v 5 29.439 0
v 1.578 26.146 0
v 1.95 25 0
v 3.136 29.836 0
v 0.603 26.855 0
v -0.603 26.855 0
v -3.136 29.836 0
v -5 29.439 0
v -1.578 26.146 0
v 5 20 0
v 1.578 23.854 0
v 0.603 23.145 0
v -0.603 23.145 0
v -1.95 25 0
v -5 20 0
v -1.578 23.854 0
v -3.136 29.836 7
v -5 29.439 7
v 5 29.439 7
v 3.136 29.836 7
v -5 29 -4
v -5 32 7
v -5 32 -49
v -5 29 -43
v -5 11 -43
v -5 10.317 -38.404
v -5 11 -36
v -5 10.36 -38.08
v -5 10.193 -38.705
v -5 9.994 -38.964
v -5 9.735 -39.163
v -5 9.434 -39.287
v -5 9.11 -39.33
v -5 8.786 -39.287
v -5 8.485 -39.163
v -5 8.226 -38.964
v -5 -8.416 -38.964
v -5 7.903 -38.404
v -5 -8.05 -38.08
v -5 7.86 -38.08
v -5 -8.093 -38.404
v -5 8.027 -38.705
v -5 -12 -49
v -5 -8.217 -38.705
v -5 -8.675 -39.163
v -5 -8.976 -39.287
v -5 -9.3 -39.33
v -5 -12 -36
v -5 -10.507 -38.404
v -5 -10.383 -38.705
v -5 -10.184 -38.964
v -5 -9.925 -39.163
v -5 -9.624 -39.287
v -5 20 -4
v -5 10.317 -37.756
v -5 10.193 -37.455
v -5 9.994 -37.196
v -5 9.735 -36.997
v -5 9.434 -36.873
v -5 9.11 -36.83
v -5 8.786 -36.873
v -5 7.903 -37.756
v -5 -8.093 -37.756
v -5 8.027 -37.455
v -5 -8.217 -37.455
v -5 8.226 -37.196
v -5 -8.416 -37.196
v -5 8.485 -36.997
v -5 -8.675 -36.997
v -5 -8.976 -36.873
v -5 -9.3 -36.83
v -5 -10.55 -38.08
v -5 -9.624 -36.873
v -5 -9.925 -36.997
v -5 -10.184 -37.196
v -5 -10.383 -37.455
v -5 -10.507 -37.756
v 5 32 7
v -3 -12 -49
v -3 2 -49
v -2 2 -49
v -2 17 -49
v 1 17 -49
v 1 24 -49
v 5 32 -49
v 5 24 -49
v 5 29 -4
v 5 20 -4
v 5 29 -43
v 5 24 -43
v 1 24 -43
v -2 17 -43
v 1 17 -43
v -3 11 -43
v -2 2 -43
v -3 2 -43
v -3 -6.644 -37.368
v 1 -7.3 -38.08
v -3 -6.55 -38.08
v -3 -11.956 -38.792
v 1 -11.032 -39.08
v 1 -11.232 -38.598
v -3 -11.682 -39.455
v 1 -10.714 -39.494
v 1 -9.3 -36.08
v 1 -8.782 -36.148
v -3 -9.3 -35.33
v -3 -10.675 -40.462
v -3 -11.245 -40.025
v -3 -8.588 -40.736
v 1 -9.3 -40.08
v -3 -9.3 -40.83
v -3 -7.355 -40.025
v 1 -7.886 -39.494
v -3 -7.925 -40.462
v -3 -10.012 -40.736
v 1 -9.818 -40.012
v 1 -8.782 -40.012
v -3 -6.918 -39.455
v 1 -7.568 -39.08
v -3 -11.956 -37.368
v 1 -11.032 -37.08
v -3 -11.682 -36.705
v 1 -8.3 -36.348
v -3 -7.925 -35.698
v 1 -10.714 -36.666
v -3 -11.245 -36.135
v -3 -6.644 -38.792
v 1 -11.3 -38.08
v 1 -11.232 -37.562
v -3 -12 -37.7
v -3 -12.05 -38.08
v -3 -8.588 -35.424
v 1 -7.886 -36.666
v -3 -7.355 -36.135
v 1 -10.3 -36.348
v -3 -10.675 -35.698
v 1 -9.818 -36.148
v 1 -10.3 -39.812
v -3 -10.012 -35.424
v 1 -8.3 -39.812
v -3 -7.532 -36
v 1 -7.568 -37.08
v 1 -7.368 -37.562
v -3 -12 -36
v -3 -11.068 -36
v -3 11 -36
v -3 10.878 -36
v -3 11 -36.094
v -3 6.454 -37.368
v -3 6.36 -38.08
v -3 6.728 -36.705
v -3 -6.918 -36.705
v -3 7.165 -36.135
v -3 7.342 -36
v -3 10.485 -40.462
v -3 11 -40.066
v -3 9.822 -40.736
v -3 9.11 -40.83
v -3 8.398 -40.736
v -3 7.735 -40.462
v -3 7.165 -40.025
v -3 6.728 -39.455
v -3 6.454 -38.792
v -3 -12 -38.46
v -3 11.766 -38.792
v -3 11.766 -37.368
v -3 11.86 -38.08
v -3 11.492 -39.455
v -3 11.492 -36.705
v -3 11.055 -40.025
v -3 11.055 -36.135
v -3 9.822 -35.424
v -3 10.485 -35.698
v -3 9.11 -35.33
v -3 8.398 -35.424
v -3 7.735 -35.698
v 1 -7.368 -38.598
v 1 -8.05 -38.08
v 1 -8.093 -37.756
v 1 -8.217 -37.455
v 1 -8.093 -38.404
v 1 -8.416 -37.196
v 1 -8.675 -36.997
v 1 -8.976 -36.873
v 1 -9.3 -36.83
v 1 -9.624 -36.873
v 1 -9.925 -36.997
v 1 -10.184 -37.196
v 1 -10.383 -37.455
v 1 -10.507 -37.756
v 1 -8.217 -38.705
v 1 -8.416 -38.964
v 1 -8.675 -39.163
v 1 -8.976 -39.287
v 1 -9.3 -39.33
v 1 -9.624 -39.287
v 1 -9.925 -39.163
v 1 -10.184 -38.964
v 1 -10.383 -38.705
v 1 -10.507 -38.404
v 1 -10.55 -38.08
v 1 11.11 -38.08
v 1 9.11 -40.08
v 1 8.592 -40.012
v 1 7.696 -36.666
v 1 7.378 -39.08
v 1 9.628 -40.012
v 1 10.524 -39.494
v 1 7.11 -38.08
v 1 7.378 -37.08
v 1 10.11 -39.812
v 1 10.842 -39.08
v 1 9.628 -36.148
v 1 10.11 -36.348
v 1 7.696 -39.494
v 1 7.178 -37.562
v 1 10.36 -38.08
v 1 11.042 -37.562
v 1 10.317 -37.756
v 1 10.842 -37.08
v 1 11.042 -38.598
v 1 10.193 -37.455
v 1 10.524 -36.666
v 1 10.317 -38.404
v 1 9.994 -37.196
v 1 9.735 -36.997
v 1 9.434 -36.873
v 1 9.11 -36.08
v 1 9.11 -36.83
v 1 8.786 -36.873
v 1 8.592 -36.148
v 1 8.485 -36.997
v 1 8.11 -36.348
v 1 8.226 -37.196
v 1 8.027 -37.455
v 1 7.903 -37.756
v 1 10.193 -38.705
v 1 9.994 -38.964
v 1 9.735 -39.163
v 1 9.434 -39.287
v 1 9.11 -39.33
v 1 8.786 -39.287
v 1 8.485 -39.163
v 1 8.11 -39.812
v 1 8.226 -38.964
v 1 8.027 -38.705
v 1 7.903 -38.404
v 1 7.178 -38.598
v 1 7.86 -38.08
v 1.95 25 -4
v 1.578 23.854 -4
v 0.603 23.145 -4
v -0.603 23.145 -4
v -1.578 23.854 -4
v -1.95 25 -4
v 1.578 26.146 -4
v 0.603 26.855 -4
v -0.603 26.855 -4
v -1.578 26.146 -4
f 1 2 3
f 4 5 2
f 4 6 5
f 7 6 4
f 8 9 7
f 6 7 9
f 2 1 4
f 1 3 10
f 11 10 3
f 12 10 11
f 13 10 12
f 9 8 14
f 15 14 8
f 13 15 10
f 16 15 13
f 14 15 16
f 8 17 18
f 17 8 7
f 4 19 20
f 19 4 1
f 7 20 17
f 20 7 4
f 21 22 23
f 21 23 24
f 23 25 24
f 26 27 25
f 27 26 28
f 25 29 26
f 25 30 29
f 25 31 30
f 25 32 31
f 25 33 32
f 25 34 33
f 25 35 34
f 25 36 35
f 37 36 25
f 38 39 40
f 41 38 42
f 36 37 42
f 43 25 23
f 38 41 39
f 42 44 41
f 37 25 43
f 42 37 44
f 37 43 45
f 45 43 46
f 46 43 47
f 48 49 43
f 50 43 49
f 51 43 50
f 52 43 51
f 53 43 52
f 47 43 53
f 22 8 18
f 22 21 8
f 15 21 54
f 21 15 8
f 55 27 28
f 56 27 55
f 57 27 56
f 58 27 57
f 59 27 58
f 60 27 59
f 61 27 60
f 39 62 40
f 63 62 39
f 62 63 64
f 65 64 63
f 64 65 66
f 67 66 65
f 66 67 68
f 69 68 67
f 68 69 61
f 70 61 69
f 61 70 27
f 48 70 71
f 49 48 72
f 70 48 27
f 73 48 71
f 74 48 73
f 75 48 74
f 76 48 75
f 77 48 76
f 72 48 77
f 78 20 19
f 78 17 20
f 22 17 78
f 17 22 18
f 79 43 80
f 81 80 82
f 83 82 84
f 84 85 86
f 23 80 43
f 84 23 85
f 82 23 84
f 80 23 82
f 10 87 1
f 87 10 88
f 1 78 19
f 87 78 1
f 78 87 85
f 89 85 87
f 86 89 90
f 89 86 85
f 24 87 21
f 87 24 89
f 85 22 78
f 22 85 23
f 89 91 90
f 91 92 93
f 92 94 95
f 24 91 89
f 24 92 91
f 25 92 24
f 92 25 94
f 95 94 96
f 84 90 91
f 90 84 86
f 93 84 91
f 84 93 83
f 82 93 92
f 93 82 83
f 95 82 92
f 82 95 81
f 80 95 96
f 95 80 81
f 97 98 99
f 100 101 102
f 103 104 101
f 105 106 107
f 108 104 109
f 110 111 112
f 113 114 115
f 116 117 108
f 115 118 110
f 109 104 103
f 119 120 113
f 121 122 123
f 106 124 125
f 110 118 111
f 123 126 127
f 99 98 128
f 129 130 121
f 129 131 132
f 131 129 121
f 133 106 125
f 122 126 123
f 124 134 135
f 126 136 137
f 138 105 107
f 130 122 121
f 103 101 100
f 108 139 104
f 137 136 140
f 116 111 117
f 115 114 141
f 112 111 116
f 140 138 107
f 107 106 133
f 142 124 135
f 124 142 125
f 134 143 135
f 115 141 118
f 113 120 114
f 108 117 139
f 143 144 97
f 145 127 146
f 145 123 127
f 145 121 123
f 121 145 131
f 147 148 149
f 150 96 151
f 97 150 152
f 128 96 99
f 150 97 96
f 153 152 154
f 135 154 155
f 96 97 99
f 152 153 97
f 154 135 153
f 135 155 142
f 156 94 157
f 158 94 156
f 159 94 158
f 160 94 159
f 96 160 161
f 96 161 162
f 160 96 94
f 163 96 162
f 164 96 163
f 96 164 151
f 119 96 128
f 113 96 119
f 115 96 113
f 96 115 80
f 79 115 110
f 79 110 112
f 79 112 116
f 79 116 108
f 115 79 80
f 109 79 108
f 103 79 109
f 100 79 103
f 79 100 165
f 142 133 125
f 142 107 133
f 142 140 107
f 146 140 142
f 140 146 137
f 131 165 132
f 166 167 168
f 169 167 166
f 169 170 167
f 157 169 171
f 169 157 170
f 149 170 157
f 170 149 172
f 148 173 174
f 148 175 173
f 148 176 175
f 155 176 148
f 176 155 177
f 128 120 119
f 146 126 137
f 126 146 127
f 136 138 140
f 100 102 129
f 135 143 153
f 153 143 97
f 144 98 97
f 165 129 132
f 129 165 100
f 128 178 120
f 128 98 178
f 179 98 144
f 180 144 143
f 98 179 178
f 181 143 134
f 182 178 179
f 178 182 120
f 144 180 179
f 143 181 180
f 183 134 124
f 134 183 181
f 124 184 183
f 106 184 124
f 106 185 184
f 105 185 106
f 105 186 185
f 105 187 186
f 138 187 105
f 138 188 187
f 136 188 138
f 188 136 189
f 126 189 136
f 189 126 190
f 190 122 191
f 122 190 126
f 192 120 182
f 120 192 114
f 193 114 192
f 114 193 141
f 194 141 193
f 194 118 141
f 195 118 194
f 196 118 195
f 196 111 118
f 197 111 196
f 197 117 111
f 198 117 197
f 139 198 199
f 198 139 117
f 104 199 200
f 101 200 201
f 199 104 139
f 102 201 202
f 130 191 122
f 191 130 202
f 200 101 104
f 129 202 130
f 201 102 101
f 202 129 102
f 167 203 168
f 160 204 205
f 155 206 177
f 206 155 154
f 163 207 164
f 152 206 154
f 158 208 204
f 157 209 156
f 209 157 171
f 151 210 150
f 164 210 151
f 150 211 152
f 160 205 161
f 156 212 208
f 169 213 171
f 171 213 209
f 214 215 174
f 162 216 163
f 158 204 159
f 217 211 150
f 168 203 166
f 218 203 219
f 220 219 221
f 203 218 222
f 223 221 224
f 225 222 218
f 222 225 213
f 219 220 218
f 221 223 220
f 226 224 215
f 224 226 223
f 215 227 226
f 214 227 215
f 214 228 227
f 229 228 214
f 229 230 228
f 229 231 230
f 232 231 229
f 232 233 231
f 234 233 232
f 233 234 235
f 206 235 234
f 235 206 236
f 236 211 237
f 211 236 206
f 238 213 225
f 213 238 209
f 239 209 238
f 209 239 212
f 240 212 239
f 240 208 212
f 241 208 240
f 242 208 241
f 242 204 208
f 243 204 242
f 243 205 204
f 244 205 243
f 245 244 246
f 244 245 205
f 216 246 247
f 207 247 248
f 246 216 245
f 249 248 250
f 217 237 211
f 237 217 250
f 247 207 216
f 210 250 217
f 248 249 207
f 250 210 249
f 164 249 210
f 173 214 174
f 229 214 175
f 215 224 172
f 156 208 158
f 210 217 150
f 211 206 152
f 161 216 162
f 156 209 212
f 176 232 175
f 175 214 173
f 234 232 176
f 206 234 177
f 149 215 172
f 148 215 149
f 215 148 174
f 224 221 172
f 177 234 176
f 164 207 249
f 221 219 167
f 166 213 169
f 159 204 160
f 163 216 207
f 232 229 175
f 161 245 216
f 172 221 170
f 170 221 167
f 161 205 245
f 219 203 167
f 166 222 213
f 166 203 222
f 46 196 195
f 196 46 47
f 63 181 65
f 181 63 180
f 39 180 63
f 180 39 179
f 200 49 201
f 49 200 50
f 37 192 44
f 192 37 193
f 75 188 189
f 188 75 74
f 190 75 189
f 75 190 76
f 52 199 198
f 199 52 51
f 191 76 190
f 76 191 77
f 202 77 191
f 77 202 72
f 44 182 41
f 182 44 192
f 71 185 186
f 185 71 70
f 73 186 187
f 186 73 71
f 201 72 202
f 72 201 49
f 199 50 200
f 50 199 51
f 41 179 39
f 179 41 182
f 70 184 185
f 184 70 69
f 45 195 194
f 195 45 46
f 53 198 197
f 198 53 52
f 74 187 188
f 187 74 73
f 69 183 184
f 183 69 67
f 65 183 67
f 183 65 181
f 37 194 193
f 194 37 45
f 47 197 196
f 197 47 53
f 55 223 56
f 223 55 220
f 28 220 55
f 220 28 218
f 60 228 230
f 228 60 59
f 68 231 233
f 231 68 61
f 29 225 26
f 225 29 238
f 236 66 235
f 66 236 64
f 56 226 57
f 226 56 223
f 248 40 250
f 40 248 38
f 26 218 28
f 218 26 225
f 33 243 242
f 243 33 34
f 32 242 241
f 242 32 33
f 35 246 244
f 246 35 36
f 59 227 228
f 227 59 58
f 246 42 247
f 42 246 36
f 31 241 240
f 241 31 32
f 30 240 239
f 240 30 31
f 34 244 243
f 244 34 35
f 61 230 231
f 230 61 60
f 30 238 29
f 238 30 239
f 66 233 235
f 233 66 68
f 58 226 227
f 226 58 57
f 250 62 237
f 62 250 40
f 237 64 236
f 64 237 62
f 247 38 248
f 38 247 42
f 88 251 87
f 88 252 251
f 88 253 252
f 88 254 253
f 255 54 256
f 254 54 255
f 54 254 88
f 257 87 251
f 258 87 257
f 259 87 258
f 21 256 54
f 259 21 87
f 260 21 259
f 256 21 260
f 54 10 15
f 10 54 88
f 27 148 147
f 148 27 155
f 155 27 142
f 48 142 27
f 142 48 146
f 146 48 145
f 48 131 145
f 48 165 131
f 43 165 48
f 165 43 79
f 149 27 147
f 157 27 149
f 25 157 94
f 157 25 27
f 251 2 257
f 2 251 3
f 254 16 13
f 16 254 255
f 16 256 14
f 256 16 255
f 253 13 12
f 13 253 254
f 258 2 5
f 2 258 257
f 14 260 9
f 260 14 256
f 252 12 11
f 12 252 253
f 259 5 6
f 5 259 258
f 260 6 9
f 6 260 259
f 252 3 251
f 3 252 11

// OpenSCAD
// file: Geeetech/utility.scad
//
// Copyright (C) 2015, Jason S. McMullan <jason.mcmullan@gmail.com>
// All right reserved.
//
// Licensed under the MIT License:
//
// Permission is hereby granted, free of charge, to any person obtaining
// a copy of this software and associated documentation files (the "Software"),
// to deal in the Software without restriction, including without limitation
// the rights to use, copy, modify, merge, publish, distribute, sublicense,
// and/or sell copies of the Software, and to permit persons to whom the
// Software is furnished to do so, subject to the following conditions:
//
// The above copyright notice and this permission notice shall be included
// in all copies or substantial portions of the Software.
//
// THE SOFTWARE IS PROVIDED "AS IS", WITHOUT WARRANTY OF ANY KIND, EXPRESS OR
// IMPLIED, INCLUDING BUT NOT LIMITED TO THE WARRANTIES OF MERCHANTABILITY,
// FITNESS FOR A PARTICULAR PURPOSE AND NONINFRINGEMENT. IN NO EVENT SHALL THE
// AUTHORS OR COPYRIGHT HOLDERS BE LIABLE FOR ANY CLAIM, DAMAGES OR OTHER
// LIABILITY, WHETHER IN AN ACTION OF CONTRACT, TORT OR OTHERWISE, ARISING
// FROM, OUT OF OR IN CONNECTION WITH THE SOFTWARE OR THE USE OR OTHER
// DEALINGS IN THE SOFTWARE.
//

// Like the towers of hanoi, this adds a cylinder, then calls
// children() to stack another on top. Useful for modelling J-Heads
module utility_hanoi(d=1, h=1, fn=24)
{
    cylinder(d=d, h=h, $fn=fn);
    translate([0, 0, h])
        children();
}


// make a plate with mitred edges
module utility_plate_mitred_edge(size=[20, 30, 4], radius=4)
{
    hull() {
        translate([-(size[0]/2-radius), (size[1]/2-radius)])
            cylinder(r=radius, h=size[2], $fn=24);
        translate([-(size[0]/2-radius), -(size[1]/2-radius)])
            cylinder(r=radius, h=size[2], $fn=24);
        translate([(size[0]/2-radius), (size[1]/2-radius)])
            cylinder(r=radius, h=size[2], $fn=24);
        translate([(size[0]/2-radius), -(size[1]/2-radius)])
            cylinder(r=radius, h=size[2], $fn=24);
    }
}

module utility_plate_mitred_top(size=[20, 30, 20], radius=4)
{
    translate([-size[0]/2, -size[1]/2, 0])
    hull() {
        cube([size[0], size[1], size[2] - radius]);
        translate([radius, 0, size[2] - radius])
            rotate([-90, 0, 0]) {
                cylinder(r=radius, h=size[1]);
                translate([size[0]-radius*2, 0, 0])
                    cylinder(r=radius, h=size[1]);
        }
    }
}

// make a cylinder or torus a mitred top
module utility_torus_mitred_top(id=10, od=40, height=8, radius=2, hole = true)
{
    rotate_extrude() {
        hull()
        {
            translate([id/2+radius, height-radius]) circle(r=radius,$fn=24);
            translate([od/2-radius, height-radius]) circle(r=radius,$fn=24);
            if (hole)
                translate([id/2,0]) square([(od-id)/2, height-radius]);
            else
                square([od/2, height]);
        }
    }
}

// vim: set shiftwidth=4 expandtab: //
// file: E3D/v6_nozzle.scad
//
// Copyright (C) 2015, Jason S. McMullan <jason.mcmullan@gmail.com>
// All right reserved.
//
// Redistribution and use in source and binary forms, with or without
// modification, are permitted provided that the following conditions
// are met:
// 1. Redistributions of source code must retain the above copyright
//    notice, this list of conditions and the following disclaimer,
//    without modification, immediately at the beginning of the file.
// 2. Redistributions in binary form must reproduce the above copyright
//    notice, this list of conditions and the following disclaimer in the
//    documentation and/or other materials provided with the distribution.
//
// THIS SOFTWARE IS PROVIDED BY THE AUTHOR ``AS IS\'\' AND ANY EXPRESS OR
// IMPLIED WARRANTIES, INCLUDING, BUT NOT LIMITED TO, THE IMPLIED WARRANTIES
// OF MERCHANTABILITY AND FITNESS FOR A PARTICULAR PURPOSE ARE DISCLAIMED.
// IN NO EVENT SHALL THE AUTHOR BE LIABLE FOR ANY DIRECT, INDIRECT,
// INCIDENTAL, SPECIAL, EXEMPLARY, OR CONSEQUENTIAL DAMAGES (INCLUDING, BUT
// NOT LIMITED TO, PROCUREMENT OF SUBSTITUTE GOODS OR SERVICES; LOSS OF USE,
// DATA, OR PROFITS; OR BUSINESS INTERRUPTION) HOWEVER CAUSED AND ON ANY
// THEORY OF LIABILITY, WHETHER IN CONTRACT, STRICT LIABILITY, OR TORT
// (INCLUDING NEGLIGENCE OR OTHERWISE) ARISING IN ANY WAY OUT OF THE USE OF
// THIS SOFTWARE, EVEN IF ADVISED OF THE POSSIBILITY OF SUCH DAMAGE.
//
// All units are in mm

// The nozzle tip is located at (0,0,0)
// The nozzle is 12.5mm high
// The nozzle defaults to the 0.3mm geometry
// Children attached at the bottom center of the screw threads
module e3d_v6_nozzle() {
    difference() {
        union() {
            cylinder(d1=0.75, d2=(0.75+2*cos(125-90)*(12.5-10.7)), h=(12.5-10.7), $fn=10);
            translate([0, 0, (12.5-10.7)]) {
                cylinder(r=7/sqrt(3), h=3, $fn=6);
                translate([0, 0, 3]) {
                    cylinder(d=5, h=1.5);
                    translate([0,0, 1.5]) {
                        cylinder(d=6, h=6, $fn=15);
                    }
                }
            }
        }
        translate([0, 0, -0.1])
            cylinder(r=0.3, h=(12.5-10.7)+0.1);
        translate([0, 0, 12.5-10.7])
            cylinder(d=2, h=10.7+0.1, $fn=10);
    }

    translate([0, 0, (12.5-10.7+3+1.5)])
    children();
}

// vim: set shiftwidth=4 expandtab: //
// file: E3D/v6_block.scad
//
// Copyright (C) 2015, Jason S. McMullan <jason.mcmullan@gmail.com>
// All right reserved.
//
// Redistribution and use in source and binary forms, with or without
// modification, are permitted provided that the following conditions
// are met:
// 1. Redistributions of source code must retain the above copyright
//    notice, this list of conditions and the following disclaimer,
//    without modification, immediately at the beginning of the file.
// 2. Redistributions in binary form must reproduce the above copyright
//    notice, this list of conditions and the following disclaimer in the
//    documentation and/or other materials provided with the distribution.
//
// THIS SOFTWARE IS PROVIDED BY THE AUTHOR ``AS IS\'\' AND ANY EXPRESS OR
// IMPLIED WARRANTIES, INCLUDING, BUT NOT LIMITED TO, THE IMPLIED WARRANTIES
// OF MERCHANTABILITY AND FITNESS FOR A PARTICULAR PURPOSE ARE DISCLAIMED.
// IN NO EVENT SHALL THE AUTHOR BE LIABLE FOR ANY DIRECT, INDIRECT,
// INCIDENTAL, SPECIAL, EXEMPLARY, OR CONSEQUENTIAL DAMAGES (INCLUDING, BUT
// NOT LIMITED TO, PROCUREMENT OF SUBSTITUTE GOODS OR SERVICES; LOSS OF USE,
// DATA, OR PROFITS; OR BUSINESS INTERRUPTION) HOWEVER CAUSED AND ON ANY
// THEORY OF LIABILITY, WHETHER IN CONTRACT, STRICT LIABILITY, OR TORT
// (INCLUDING NEGLIGENCE OR OTHERWISE) ARISING IN ANY WAY OUT OF THE USE OF
// THIS SOFTWARE, EVEN IF ADVISED OF THE POSSIBILITY OF SUCH DAMAGE.
//
// All units are in mm

include <utility.scad>

// Origin (0,0,0) is bottom center of transition zone thread
// Children attached at top center of transition zone thread
module e3d_v6_block()
{
        translate([-15.5, -8, 0])
        difference() {
            cube([20, 16, 11.5]);
            translate([2.5, 8, 11.5])
                drill_down(diameter=3, depth=12);
            translate([15.5, 8, 11.5])
                drill_down(diameter=6, depth=12);
            translate([-0.1, -0.1, 3])
                cube([6, 16.2, 2]);
            translate([8.5, 0, 4])
                rotate([90, 0, 0])
                drill_down(diameter=6, depth=16.1);
            translate([16.5, 0, 4.8])
                rotate([90, 0, 0])
                drill_down(diameter=3, depth=3.5);
            translate([18, 0, 2])
                rotate([90, 0, 0]) {
                    drill_down(diameter=2, depth=2);
                    drill_down(diameter=1.5, depth=4.5);
                }
        }

        translate([0, 0, 11.5])
            children();
}

// vim: set shiftwidth=4 expandtab: //
// file: E3D/utility.scad
//
// Copyright (C) 2015, Jason S. McMullan <jason.mcmullan@gmail.com>
// All right reserved.
//
// Redistribution and use in source and binary forms, with or without
// modification, are permitted provided that the following conditions
// are met:
// 1. Redistributions of source code must retain the above copyright
//    notice, this list of conditions and the following disclaimer,
//    without modification, immediately at the beginning of the file.
// 2. Redistributions in binary form must reproduce the above copyright
//    notice, this list of conditions and the following disclaimer in the
//    documentation and/or other materials provided with the distribution.
//
// THIS SOFTWARE IS PROVIDED BY THE AUTHOR ``AS IS\'\' AND ANY EXPRESS OR
// IMPLIED WARRANTIES, INCLUDING, BUT NOT LIMITED TO, THE IMPLIED WARRANTIES
// OF MERCHANTABILITY AND FITNESS FOR A PARTICULAR PURPOSE ARE DISCLAIMED.
// IN NO EVENT SHALL THE AUTHOR BE LIABLE FOR ANY DIRECT, INDIRECT,
// INCIDENTAL, SPECIAL, EXEMPLARY, OR CONSEQUENTIAL DAMAGES (INCLUDING, BUT
// NOT LIMITED TO, PROCUREMENT OF SUBSTITUTE GOODS OR SERVICES; LOSS OF USE,
// DATA, OR PROFITS; OR BUSINESS INTERRUPTION) HOWEVER CAUSED AND ON ANY
// THEORY OF LIABILITY, WHETHER IN CONTRACT, STRICT LIABILITY, OR TORT
// (INCLUDING NEGLIGENCE OR OTHERWISE) ARISING IN ANY WAY OUT OF THE USE OF
// THIS SOFTWARE, EVEN IF ADVISED OF THE POSSIBILITY OF SUCH DAMAGE.
//
// All units are in mm

// Origin is top, left, front
module fan(size=20, height=5)
{
    translate([0, 0, -height]) {
        difference() {
                cube([size, size, height]);
                translate([size/2, size/2, -0.1])
                    cylinder(d=size*0.8, h=height+0.2, $fn=24);
        }
        translate([size/2, size/2, -0.1])
            cylinder(d=size*0.5, h=height+0.2, $fn=24);
    }
}

module drill_down(diameter=3, depth=5)
{
    translate([0, 0, -depth])
        cylinder(r=diameter/2, h=depth+0.01, $fn=10);
}

// Like the towers of hanoi, this adds a cylinder, then calls
// children() to stack another on top. Useful for the E3D heat sinks.
module hanoi(d=1, h=1, fn=24)
{
    cylinder(d=d, h=h, $fn=fn);
    translate([0, 0, h])
        children();
}

// vim: set shiftwidth=4 expandtab: //
// file: Geeetech/rostock_g2_spider.scad
//
// Copyright (C) 2015, Jason S. McMullan <jason.mcmullan@gmail.com>
// All right reserved.
//
// Licensed under the MIT License:
//
// Permission is hereby granted, free of charge, to any person obtaining
// a copy of this software and associated documentation files (the "Software"),
// to deal in the Software without restriction, including without limitation
// the rights to use, copy, modify, merge, publish, distribute, sublicense,
// and/or sell copies of the Software, and to permit persons to whom the
// Software is furnished to do so, subject to the following conditions:
//
// The above copyright notice and this permission notice shall be included
// in all copies or substantial portions of the Software.
//
// THE SOFTWARE IS PROVIDED "AS IS", WITHOUT WARRANTY OF ANY KIND, EXPRESS OR
// IMPLIED, INCLUDING BUT NOT LIMITED TO THE WARRANTIES OF MERCHANTABILITY,
// FITNESS FOR A PARTICULAR PURPOSE AND NONINFRINGEMENT. IN NO EVENT SHALL THE
// AUTHORS OR COPYRIGHT HOLDERS BE LIABLE FOR ANY CLAIM, DAMAGES OR OTHER
// LIABILITY, WHETHER IN AN ACTION OF CONTRACT, TORT OR OTHERWISE, ARISING
// FROM, OUT OF OR IN CONNECTION WITH THE SOFTWARE OR THE USE OR OTHER
// DEALINGS IN THE SOFTWARE.
//

use <utility.scad>

module geeetech_rostock_g2_spider_leg()
{
  translate([14, 17, 0]) {
    cube([9, 13, 8]);
    cube([9, 17, 3]);
  }
  translate([14, 34, 6])
    rotate([0, 90, 0]) {
        difference() {
            cylinder(d=12, h=9, $fn=24);
            translate([0, 0, -0.1])
            cylinder(d=6.25, h=9.2, $fn=24);
        }
    }
}

module geeetech_rostock_g2_spider_bracket()
{
    geeetech_rostock_g2_spider_leg();
    mirror([1, 0, 0]) geeetech_rostock_g2_spider_leg();
}


module geeetech_rostock_g2_spider_zprobe()
{
    translate([-10, 26, 0])
        cube([20, 4, 8]);
    translate([-6, 20, 0])
        cube([12, 10, 19.2]);
}

module geeetech_rostock_g2_spider_blank(zprobe = true, hole = false)
{
    difference() {
        union() {
            utility_torus_mitred_top(id=40.125, od=60, height=8, radius=1.5, hole=hole);

            for (i = [0:2]) {
                rotate([0, 0, i*120]) geeetech_rostock_g2_spider_bracket();
            }

            if (zprobe)
                geeetech_rostock_g2_spider_zprobe();
        }
                // Z-probe drills
        if (zprobe) {
           translate([-4.7, 30.1, 5.5])
                rotate([90, 0, 0])
                    cylinder(d=3-0.2, h=8.2, $fn=12);
           translate([4.7, 30.1, 5.5])
                rotate([90, 0, 0])
                    cylinder(d=3-0.2, h=8.2, $fn=12);
            translate([0, 23.5, -0.1])
                cylinder(d=3+0.5, h=20, $fn=12);
            translate([-1.5, 24, 8])
                cube([3, 8, 18]);
            translate([0, 22-0.5, 17])
                rotate([0, 0, 15]) cube([8, 3, 3]);
        }
    }
}

module geeetech_rostock_g2_spider(zprobe = true, hole = true)
{
    difference() {
        geeetech_rostock_g2_spider_blank(zprobe=zprobe, hole=hole);

        // Drills for Geetech J-Head and fan mounts
        for (i = [(zprobe ? 1 : 0):5]) {
            rotate([0, 0, i*60]) translate([0, 25, -0.1])
                cylinder(d=4.25, h=10, $fn=24);
        }
    }
}

// Debug interference model:
if (false) {
    # translate([-46.125, -40+0.125, 0])
            import("RKMA-B02-platform.STL", convexity=5);
    geeetech_rostock_g2_spider(zprobe=true);
}

module geeetech_rostock_g2_spider_no_probe()
{
    geeetech_rostock_g2_spider(zprobe=false);
}

module geeetech_rostock_g2_spider_z_probe()
{
    geeetech_rostock_g2_spider(zprobe=true);
}

// vim: set shiftwidth=4 expandtab: //
// file: Geeetech/rostock_g2_jhead_x2.scad
//
// Copyright (C) 2015, Jason S. McMullan <jason.mcmullan@gmail.com>
// All right reserved.
//
// Licensed under the MIT License:
//
// Permission is hereby granted, free of charge, to any person obtaining
// a copy of this software and associated documentation files (the "Software"),
// to deal in the Software without restriction, including without limitation
// the rights to use, copy, modify, merge, publish, distribute, sublicense,
// and/or sell copies of the Software, and to permit persons to whom the
// Software is furnished to do so, subject to the following conditions:
//
// The above copyright notice and this permission notice shall be included
// in all copies or substantial portions of the Software.
//
// THE SOFTWARE IS PROVIDED "AS IS", WITHOUT WARRANTY OF ANY KIND, EXPRESS OR
// IMPLIED, INCLUDING BUT NOT LIMITED TO THE WARRANTIES OF MERCHANTABILITY,
// FITNESS FOR A PARTICULAR PURPOSE AND NONINFRINGEMENT. IN NO EVENT SHALL THE
// AUTHORS OR COPYRIGHT HOLDERS BE LIABLE FOR ANY CLAIM, DAMAGES OR OTHER
// LIABILITY, WHETHER IN AN ACTION OF CONTRACT, TORT OR OTHERWISE, ARISING
// FROM, OUT OF OR IN CONNECTION WITH THE SOFTWARE OR THE USE OR OTHER
// DEALINGS IN THE SOFTWARE.
//
use <utility.scad>;

module geeetech_rostock_g2_jhead_x2_drill_bolt()
{
    translate([7.5, 13, -3.1]) {
        cylinder(d=3.6, h=9.2, $fn=12);
        translate([0, 0, 6]) {
            cylinder(r=6/sqrt(3), h=4, $fn=6);
        }
    }
    translate([7.5, -13, -3.1]) {
        cylinder(d=3.6, h=9.2, $fn=12);
        translate([0, 0, 6]) {
            cylinder(r=6/sqrt(3), h=4, $fn=6);
        }
    }
}

module geeetech_rostock_g2_jhead_x2_drill(spread=0)
{
    translate([10+spread/2, 0, -0.1])
        cylinder(d=17, h=6.2, $fn=60);

    translate([25, 0, -0.1]) {
        cylinder(d=4.6, h=6.2, $fn=12);
        translate([0, 0, 3.6]) {
            cylinder(r=7/sqrt(3), h=4, $fn=6);
        }
    }

    geeetech_rostock_g2_jhead_x2_drill_bolt();
}

module geeetech_rostock_g2_jhead_x2_upper(spread=0)
{
    difference() {
        union() {
            cylinder(r=20, h=6, $fn=120);
            utility_plate_mitred_edge([63, 25, 6], radius=6);
        }

        // J-head drills
        geeetech_rostock_g2_jhead_x2_drill(spread=spread);
        mirror([1, 0, 0])
            geeetech_rostock_g2_jhead_x2_drill(spread=spread);
    }
}

module geeetech_rostock_g2_jhead_x2_lower(spread=0, groovemount = 5)
{
    difference() {
        union() {
            minkowski() {
                difference() {
                    cylinder(r=18.5, h=groovemount-1, $fn=30);
                    translate([(9.75+spread/2), 0, 0])
                        cylinder(r=7, h=9, $fn=30);
                    translate([(9.75+spread/2), -7, 0])
                        cube([10, 14, 9]);
                    translate([-(9.75+spread/2), 0, 0])
                        cylinder(r=7, h=9, $fn=30);
                    translate([-(19.75+spread/2), -7, 0])
                        cube([10, 14, 9]);
                }
                cylinder(d=2, h=0.5, $fn=24);
            }

            translate([0, 0, groovemount-0.5]) minkowski() {
                difference() {
                    cylinder(r=18.5, h=(9-groovemount), $fn=30);
                    translate([(9.75+spread/2), 0, 0])
                        cylinder(r=9.25, h=6, $fn=30);
                    translate([(9.75+spread/2), -9.25, 0])
                        cube([10, 18.5, 6]);
                    translate([-(9.75+spread/2), 0, 0])
                        cylinder(r=9.25, h=6, $fn=30);
                    translate([-(19.75+spread/2), -9.25, 0])
                        cube([10, 18.5, 6]);
                }
                cylinder(d=2, h=0.5, $fn=24);
            }
        }

        translate([0, 0, 3]) {
            geeetech_rostock_g2_jhead_x2_drill_bolt();
            mirror([1, 0, 0])
                geeetech_rostock_g2_jhead_x2_drill_bolt();
        }
    }
}

module geeetech_rostock_g2_jhead_x2_mount(spread=0, groovemount=5)
{
    geeetech_rostock_g2_jhead_x2_upper(spread=spread);
    rotate([0, 180, 0]) geeetech_rostock_g2_jhead_x2_lower(spread=spread, groovemount=groovemount);
    translate([-(10+spread/2), 0, -5]) children(0);
    translate([ (10+spread/2), 0, -5]) children(1);
}


// Debug interference model
union() {
    # translate([-31.5, -20, 0]) import("G2s/GTH3-B02-01-Mount.STL");
    geeetech_rostock_g2_jhead_x2_upper();
}

rotate([0, 180, 0]) {
    # translate([-18.12, -19.5, 0]) import("G2s/GTH3-B02-02-Mount.STL");
    geeetech_rostock_g2_jhead_x2_lower();
}
// file: Geeetech/rostock_g2_jhead_x1.scad
//
// Copyright (C) 2015, Jason S. McMullan <jason.mcmullan@gmail.com>
// All right reserved.
//
// Licensed under the MIT License:
//
// Permission is hereby granted, free of charge, to any person obtaining
// a copy of this software and associated documentation files (the "Software"),
// to deal in the Software without restriction, including without limitation
// the rights to use, copy, modify, merge, publish, distribute, sublicense,
// and/or sell copies of the Software, and to permit persons to whom the
// Software is furnished to do so, subject to the following conditions:
//
// The above copyright notice and this permission notice shall be included
// in all copies or substantial portions of the Software.
//
// THE SOFTWARE IS PROVIDED "AS IS", WITHOUT WARRANTY OF ANY KIND, EXPRESS OR
// IMPLIED, INCLUDING BUT NOT LIMITED TO THE WARRANTIES OF MERCHANTABILITY,
// FITNESS FOR A PARTICULAR PURPOSE AND NONINFRINGEMENT. IN NO EVENT SHALL THE
// AUTHORS OR COPYRIGHT HOLDERS BE LIABLE FOR ANY CLAIM, DAMAGES OR OTHER
// LIABILITY, WHETHER IN AN ACTION OF CONTRACT, TORT OR OTHERWISE, ARISING
// FROM, OUT OF OR IN CONNECTION WITH THE SOFTWARE OR THE USE OR OTHER
// DEALINGS IN THE SOFTWARE.
//

module geeetech_rostock_g2_jhead_x1_drill_m4()
{
    translate([0, 0, 2.40]) rotate([0, 0, 30]) cylinder(r=6.81/sqrt(3), h=8, $fn=6);
    cylinder(d=4.52, h=6, $fn=24);
}

module geeetech_rostock_g2_jhead_x1_drill_m3()
{
    translate([0, 0, 2.40]) cylinder(r=5.9/sqrt(3), h=8, $fn=6);
    translate([0, 0, -4])
    cylinder(d=3.52, h=10, $fn=24);
}

module geeetech_rostock_g2_jhead_x1_bolts()
{
    translate([7.5, 13, 0]) geeetech_rostock_g2_jhead_x1_drill_m3();
    translate([-7.5, 13, 0]) geeetech_rostock_g2_jhead_x1_drill_m3();
    translate([7.5, -13, 0]) geeetech_rostock_g2_jhead_x1_drill_m3();
    translate([-7.5, -13, 0]) geeetech_rostock_g2_jhead_x1_drill_m3();
}

module geeetech_rostock_g2_jhead_x1_upper()
{
    difference() {
        minkowski() {
            intersection() {
                cylinder(r=26, h=4, $fn=90);
                translate([-10, -30]) cube([20, 60, 4]);
            }
            cylinder(r=4,h=0.8, $fn=24);
        }
        translate([0, 0, -0.1]) 
            cylinder(d=16.5, h=5, $fn=60);
        translate([0, -25, 0]) geeetech_rostock_g2_jhead_x1_drill_m4();
        translate([0, 25, 0]) geeetech_rostock_g2_jhead_x1_drill_m4();

        geeetech_rostock_g2_jhead_x1_bolts();
    }
}

/* Use groovemount = 5mm for Geeetech J-Heads, groovemount = 6mm for E3D hotends
 */
module geeetech_rostock_g2_jhead_x1_lower(groovemount = 5)
{
    difference() {
        cylinder(d=38.75, h=9, $fn=64);
        translate([-1, 0, -0.1]) cylinder(d=12.025, h=9.2, $fn=48);
        translate([-1, -12.025/2, -0.1]) cube([39/2 + 1 + 0.1, 12.025, 9.2]);
        translate([-1, 0, groovemount - 0.05]) cylinder(d=16.5, h=9, $fn=48);
        translate([-1, -16.25/2,groovemount - 0.05 ]) cube([39/2 + 1 + 0.1, 16.5, 9.2]);
        translate([0, 0, 3.6]) geeetech_rostock_g2_jhead_x1_bolts();
    }
}

union() {
    union() {
        # translate([-14, -30, 0]) import("G2/GTH3-B01-01-Mount.STL");
        geeetech_rostock_g2_jhead_x1_upper();
    }
    rotate([0, 180, 0]) {
        # rotate([0, 0, 180]) translate([-18.55, -19.5]) import("G2/GTH3-B01-02-Mount.STL");
        geeetech_rostock_g2_jhead_x1_lower();
    }
}

// vim: set shiftwidth=4 expandtab: //
// file: mini_height_sensor.scad
//
// Copyright (C) 2015, Jason S. McMullan <jason.mcmullan@gmail.com>
// All right reserved.
//
// Licensed under the MIT License:
//
// Permission is hereby granted, free of charge, to any person obtaining
// a copy of this software and associated documentation files (the "Software"),
// to deal in the Software without restriction, including without limitation
// the rights to use, copy, modify, merge, publish, distribute, sublicense,
// and/or sell copies of the Software, and to permit persons to whom the
// Software is furnished to do so, subject to the following conditions:
//
// The above copyright notice and this permission notice shall be included
// in all copies or substantial portions of the Software.
//
// THE SOFTWARE IS PROVIDED "AS IS", WITHOUT WARRANTY OF ANY KIND, EXPRESS OR
// IMPLIED, INCLUDING BUT NOT LIMITED TO THE WARRANTIES OF MERCHANTABILITY,
// FITNESS FOR A PARTICULAR PURPOSE AND NONINFRINGEMENT. IN NO EVENT SHALL THE
// AUTHORS OR COPYRIGHT HOLDERS BE LIABLE FOR ANY CLAIM, DAMAGES OR OTHER
// LIABILITY, WHETHER IN AN ACTION OF CONTRACT, TORT OR OTHERWISE, ARISING
// FROM, OUT OF OR IN CONNECTION WITH THE SOFTWARE OR THE USE OR OTHER
// DEALINGS IN THE SOFTWARE.
//
// All units are in mm

module mini_height_sensor(width=1)
{
   scale([1, width, 1]) difference() {
        cube([24.0, 1, 17.62]);
        translate([0, -0.1, 0]) {
            translate([2.7,  0, 14.92])
                rotate([-90, 0, 0]) cylinder(d=2.8, h=1.2, $fn=24);
            translate([21.11, 0, 14.92])
                rotate([-90, 0, 0]) cylinder(d=2.8, h=1.2, $fn=24);
        }
    }
}

module mini_height_sensor_drill(post=4)
{
    translate([-24/2, 0, 0]) {
        translate([2.7, 0.1, 14.92]) rotate([90, 0, 0]) cylinder(d=2.5, h=post+0.2, $fn=24);
        translate([21.11, 0.1, 14.92]) rotate([90, 0, 0]) cylinder(d=2.5, h=post+0.2, $fn=24);
    }
}

// Origin is bottom middle of the sensor itself
module mini_height_sensor_mount(post=4, base=10)
{
    difference() {
        translate([-24/2, 0, 0]) {
            union() {
                translate([2.7, 0, 14.92]) rotate([90, 0, 0]) {
                    cylinder(d1=base, d2=4, h=post, $fn=24);
                }
                translate([21.11, 0, 14.92]) rotate([90, 0, 0]) {
                    cylinder(d1=base, d2=4, h=post, $fn=24);
                }
            }
        }
        mini_height_sensor_drill(post=post);
    }

    translate([-24/2, 0, 0]) 
        % translate([0, -(post+1), 0])
            mini_height_sensor();
}

# mini_height_sensor_mount();
// vim: set shiftwidth=4 expandtab: //
// file: E3D/v6_lite.scad
//
// Copyright (C) 2015, Jason S. McMullan <jason.mcmullan@gmail.com>
// All right reserved.
//
// Licensed under the MIT License:
//
// Permission is hereby granted, free of charge, to any person obtaining
// a copy of this software and associated documentation files (the "Software"),
// to deal in the Software without restriction, including without limitation
// the rights to use, copy, modify, merge, publish, distribute, sublicense,
// and/or sell copies of the Software, and to permit persons to whom the
// Software is furnished to do so, subject to the following conditions:
//
// The above copyright notice and this permission notice shall be included
// in all copies or substantial portions of the Software.
//
// THE SOFTWARE IS PROVIDED "AS IS", WITHOUT WARRANTY OF ANY KIND, EXPRESS OR
// IMPLIED, INCLUDING BUT NOT LIMITED TO THE WARRANTIES OF MERCHANTABILITY,
// FITNESS FOR A PARTICULAR PURPOSE AND NONINFRINGEMENT. IN NO EVENT SHALL THE
// AUTHORS OR COPYRIGHT HOLDERS BE LIABLE FOR ANY CLAIM, DAMAGES OR OTHER
// LIABILITY, WHETHER IN AN ACTION OF CONTRACT, TORT OR OTHERWISE, ARISING
// FROM, OUT OF OR IN CONNECTION WITH THE SOFTWARE OR THE USE OR OTHER
// DEALINGS IN THE SOFTWARE.
//
// All units are in mm

include <utility.scad>

include <v6_block.scad>
include <v6_nozzle.scad>

// Cold side of the hot end, origin at center of filament feed, bottom of sink
// Children are attached at the bottom center of the groove mount
module e3d_v6_lite_sink() {
    difference() {
        union() {
            // M6x1 threaded connector
            translate([0, 0, -5.1]) {
                cylinder(d=5.8, h=0.1, $fn=24);
                translate([0, 0, 0.1]);
                cylinder(d=6, h=5, $fn=24);
            }
            // And up the stack we go...
            hanoi(d=5.5, h=2)
            hanoi(d=22.3, h=1)
            hanoi(d=7.3, h=2)
            hanoi(d=20, h=1)
            hanoi(d=6.1, h=2.25)
            hanoi(d=20, h=1)
            hanoi(d=6.1, h=2.25)
            hanoi(d=20, h=1)
            hanoi(d=7, h=2)
            hanoi(d=22, h=1)
            hanoi(d=14, h=1.5)
            hanoi(d=22, h=1)
            hanoi(d=7, h=2)
            hanoi(d=20, h=1)
            hanoi(d=6.1, h=3)
            hanoi(d=20, h=1)
            hanoi(d=7, h=2)
            hanoi(d=22, h=1)
            hanoi(d=9, h=1.5)
            hanoi(d=16, h=1)
            hanoi(d=9, h=1.5)
            hanoi(d=16, h=3)
            hanoi(d=12, h=6)
            hanoi(d=16, h=3.7);
        }
        // Central bore
        translate([0, 0, -5.2])
                cylinder(d=4, h=0.1+7.1+42.7+0.1, $fn=24);
        // Bowden coupler bore
        translate([0, 0, 2.1+42.7-6.5-1.5]) {
                cylinder(d1=4, d2=8, h=1.5, $fn=24);
                translate([0, 0, 1.5])
                cylinder(d=8, h=6.5, $fn=24);
        }
    }

    children();
}

// Origin is bottom center of the groove mount
module e3d_v6_lite()
{
    translate([0, 0, -53])
        e3d_v6_nozzle()
        e3d_v6_block()
        e3d_v6_lite_sink();
}

e3d_v6_lite();


// vim: set shiftwidth=4 expandtab: //
// file: e3d_v6_mount.scad
//
// Copyright (C) 2015, Jason S. McMullan <jason.mcmullan@gmail.com>
// All right reserved.
//
// Licensed under the MIT License:
//
// Permission is hereby granted, free of charge, to any person obtaining
// a copy of this software and associated documentation files (the "Software"),
// to deal in the Software without restriction, including without limitation
// the rights to use, copy, modify, merge, publish, distribute, sublicense,
// and/or sell copies of the Software, and to permit persons to whom the
// Software is furnished to do so, subject to the following conditions:
//
// The above copyright notice and this permission notice shall be included
// in all copies or substantial portions of the Software.
//
// THE SOFTWARE IS PROVIDED "AS IS", WITHOUT WARRANTY OF ANY KIND, EXPRESS OR
// IMPLIED, INCLUDING BUT NOT LIMITED TO THE WARRANTIES OF MERCHANTABILITY,
// FITNESS FOR A PARTICULAR PURPOSE AND NONINFRINGEMENT. IN NO EVENT SHALL THE
// AUTHORS OR COPYRIGHT HOLDERS BE LIABLE FOR ANY CLAIM, DAMAGES OR OTHER
// LIABILITY, WHETHER IN AN ACTION OF CONTRACT, TORT OR OTHERWISE, ARISING
// FROM, OUT OF OR IN CONNECTION WITH THE SOFTWARE OR THE USE OR OTHER
// DEALINGS IN THE SOFTWARE.
//

use <Geeetech/rostock_g2_jhead_x1.scad>
use <Geeetech/rostock_g2_jhead_x2.scad>
use <Geeetech/rostock_g2_spider.scad>
use <E3D/v6_lite.scad>
use <mini_height_sensor.scad>

// Tolerance in mm for fit between metal and plastic parts.
tolerance = 0.1;

module e3d_v6_lock(spread = 30, tolerance = 0.1, duplex = false)
{
    translate([0, 0, 10]) rotate([180, 0, 0]) difference() {
        union() {
            hull() {
                translate([-spread/2, 0, 0]) cylinder(d=18-tolerance*2, h=10, $fn=180);
                translate([spread/2, 0, 0]) cylinder(d=18-tolerance*2, h=10, $fn=180);
            }
        }
        if (duplex) {
            translate([-spread/2, 0, -0.1]) cylinder(d=12+tolerance*2, h=10, $fn=180);
            translate([spread/2, 0, -0.1]) cylinder(d=12+tolerance*2, h=10, $fn=180);
        } else {
            translate([0, 0, -0.1]) cylinder(d=12+tolerance*2, h=10, $fn=180);
        }
        translate([0, 0, 6-tolerance]) {
            if (duplex) {
                translate([-spread/2, 0, -0.1]) cylinder(d=16+tolerance*2, h=10, $fn=180);
                translate([spread/2, 0, -0.1]) cylinder(d=16+tolerance*2, h=10, $fn=180);
            } else {
                translate([0, 0, -0.1]) cylinder(d=16+tolerance*2, h=10, $fn=180);
            }
        }
        translate([-spread/2-18-tolerance*4, -tolerance, -0.1]) 
            cube([spread+18*2+tolerance*5, tolerance*2, 10.2]);
    }
}

module e3d_v6_x1_lock()
{
    e3d_v6_lock(duplex = false);
}

module e3d_v6_x2_lock()
{
    e3d_v6_lock(duplex = true);
}

module e3d_v6_spider(spread = 30)
{
    translate([0, 0, 8]) rotate([180, 0, 0]) {
        difference() {
            geeetech_rostock_g2_spider(zprobe = false, hole = false);
            hull() {
                translate([-spread/2, 0, -0.1]) cylinder(d=16+tolerance*2, h=10, $fn=180);
                translate([spread/2, 0, -0.1]) cylinder(d=16+tolerance*2, h=10, $fn=180);
            }
            translate([0, 0, 3-tolerance]) e3d_v6_lock(spread=spread, tolerance = -tolerance);
        }
        if ($children == 1) {
            translate([0, 0, 9]) rotate([180, 0, 0]) children(0);
        } else if ($children == 2) {
            translate([-spread/2, 0, 9]) rotate([180, 0, 0])  children(0);
            translate([spread/2, 0, 9]) rotate([180, 0, 0]) children(1);
        }
    }
} 

// 1x Mode
 * union() {
     e3d_v6_spider() {
        # union() {
            e3d_v6_lite();
            translate([0, 0, -7]) rotate([-90, 0, 90]) import("E3D/V6.6_Duct.stl", convexity=4);
        }
    }
   translate([0, 0, -5]) e3d_v6_lock(tolerance = tolerance, duplex = false);
}

// 2x Mode
 * union() {
      % e3d_v6_spider() {
        # union() {
            e3d_v6_lite();
            translate([0, 0, -7]) rotate([-90, 0, 90]) import("E3D/V6.6_Duct.stl", convexity=4);
        }
        # union() {
            rotate([0, 0, 180]) e3d_v6_lite();
            translate([0, 0, -7]) rotate([-90, 0, 90]) import("E3D/V6.6_Duct.stl", convexity=4);
        }
    }
    translate([0, 0, -5]) e3d_v6_lock(tolerance = tolerance, duplex = true);
}

% translate([0, 0, 8]) rotate([180, 0, 0]) {
    e3d_v6_spider();
    translate([0, 50, -2]) e3d_v6_lock_x1();
    translate([0, -55, -2]) e3d_v6_lock_x2();
}
        
// vim: set shiftwidth=4 expandtab: //
// main file
//
// Copyright (C) 2015, Jason S. McMullan <jason.mcmullan@gmail.com>
// All right reserved.
//
// Licensed under the MIT License:
//
// Permission is hereby granted, free of charge, to any person obtaining
// a copy of this software and associated documentation files (the "Software"),
// to deal in the Software without restriction, including without limitation
// the rights to use, copy, modify, merge, publish, distribute, sublicense,
// and/or sell copies of the Software, and to permit persons to whom the
// Software is furnished to do so, subject to the following conditions:
//
// The above copyright notice and this permission notice shall be included
// in all copies or substantial portions of the Software.
//
// THE SOFTWARE IS PROVIDED "AS IS", WITHOUT WARRANTY OF ANY KIND, EXPRESS OR
// IMPLIED, INCLUDING BUT NOT LIMITED TO THE WARRANTIES OF MERCHANTABILITY,
// FITNESS FOR A PARTICULAR PURPOSE AND NONINFRINGEMENT. IN NO EVENT SHALL THE
// AUTHORS OR COPYRIGHT HOLDERS BE LIABLE FOR ANY CLAIM, DAMAGES OR OTHER
// LIABILITY, WHETHER IN AN ACTION OF CONTRACT, TORT OR OTHERWISE, ARISING
// FROM, OUT OF OR IN CONNECTION WITH THE SOFTWARE OR THE USE OR OTHER
// DEALINGS IN THE SOFTWARE.
//

use <e3d_v6_mount.scad>
use <E3D/v6_lite.scad>
use <mini_height_sensor.scad>

module e3d_v6_probe()
{
    difference() {
        union() {
            translate([-5, -32, -4]) cube([10, 12, 4]);
            difference() {
                translate([-5, -32, -49]) cube([10, 3, 56]);
                e3d_v6_spider();
            }
            translate([-1, -32, -49]) {
                translate([-4, 0, 0]) cube([10, 8, 6]);
                cube([6, 15, 6]); 
                translate([3, 0, 0]) cube([3, 30, 6]);
            }
            translate([3, -11, -49]) cube([2, 23, 13]);
            translate([3, 0, -53]) rotate([0, 0, -90])
                mini_height_sensor_mount(post=4, base=5.5);
        }
        translate([0, -25, -4.1]) cylinder(d=3.9, h=10, $fn=10);
        translate([5.2, 0, -53]) rotate([0, 0, -90]) mini_height_sensor_drill(post=6);
    }
}

* hunion() {
    # e3d_v6_spider() {
        union () {
            rotate([0, 0, 0]) e3d_v6_lite();
            translate([0, 0, -7]) rotate([-90, 0, -90]) import("E3D/V6.6_Duct.stl", convexity=4);
        }
        union () {
            rotate([0, 0, 180]) e3d_v6_lite();
            translate([0, 0, -7]) rotate([-90, 0, -90]) import("E3D/V6.6_Duct.stl", convexity=4);
        }
    }
}

 rotate([0, 0, 180]) e3d_v6_probe();
// vim: set shiftwidth=4 expandtab: //
